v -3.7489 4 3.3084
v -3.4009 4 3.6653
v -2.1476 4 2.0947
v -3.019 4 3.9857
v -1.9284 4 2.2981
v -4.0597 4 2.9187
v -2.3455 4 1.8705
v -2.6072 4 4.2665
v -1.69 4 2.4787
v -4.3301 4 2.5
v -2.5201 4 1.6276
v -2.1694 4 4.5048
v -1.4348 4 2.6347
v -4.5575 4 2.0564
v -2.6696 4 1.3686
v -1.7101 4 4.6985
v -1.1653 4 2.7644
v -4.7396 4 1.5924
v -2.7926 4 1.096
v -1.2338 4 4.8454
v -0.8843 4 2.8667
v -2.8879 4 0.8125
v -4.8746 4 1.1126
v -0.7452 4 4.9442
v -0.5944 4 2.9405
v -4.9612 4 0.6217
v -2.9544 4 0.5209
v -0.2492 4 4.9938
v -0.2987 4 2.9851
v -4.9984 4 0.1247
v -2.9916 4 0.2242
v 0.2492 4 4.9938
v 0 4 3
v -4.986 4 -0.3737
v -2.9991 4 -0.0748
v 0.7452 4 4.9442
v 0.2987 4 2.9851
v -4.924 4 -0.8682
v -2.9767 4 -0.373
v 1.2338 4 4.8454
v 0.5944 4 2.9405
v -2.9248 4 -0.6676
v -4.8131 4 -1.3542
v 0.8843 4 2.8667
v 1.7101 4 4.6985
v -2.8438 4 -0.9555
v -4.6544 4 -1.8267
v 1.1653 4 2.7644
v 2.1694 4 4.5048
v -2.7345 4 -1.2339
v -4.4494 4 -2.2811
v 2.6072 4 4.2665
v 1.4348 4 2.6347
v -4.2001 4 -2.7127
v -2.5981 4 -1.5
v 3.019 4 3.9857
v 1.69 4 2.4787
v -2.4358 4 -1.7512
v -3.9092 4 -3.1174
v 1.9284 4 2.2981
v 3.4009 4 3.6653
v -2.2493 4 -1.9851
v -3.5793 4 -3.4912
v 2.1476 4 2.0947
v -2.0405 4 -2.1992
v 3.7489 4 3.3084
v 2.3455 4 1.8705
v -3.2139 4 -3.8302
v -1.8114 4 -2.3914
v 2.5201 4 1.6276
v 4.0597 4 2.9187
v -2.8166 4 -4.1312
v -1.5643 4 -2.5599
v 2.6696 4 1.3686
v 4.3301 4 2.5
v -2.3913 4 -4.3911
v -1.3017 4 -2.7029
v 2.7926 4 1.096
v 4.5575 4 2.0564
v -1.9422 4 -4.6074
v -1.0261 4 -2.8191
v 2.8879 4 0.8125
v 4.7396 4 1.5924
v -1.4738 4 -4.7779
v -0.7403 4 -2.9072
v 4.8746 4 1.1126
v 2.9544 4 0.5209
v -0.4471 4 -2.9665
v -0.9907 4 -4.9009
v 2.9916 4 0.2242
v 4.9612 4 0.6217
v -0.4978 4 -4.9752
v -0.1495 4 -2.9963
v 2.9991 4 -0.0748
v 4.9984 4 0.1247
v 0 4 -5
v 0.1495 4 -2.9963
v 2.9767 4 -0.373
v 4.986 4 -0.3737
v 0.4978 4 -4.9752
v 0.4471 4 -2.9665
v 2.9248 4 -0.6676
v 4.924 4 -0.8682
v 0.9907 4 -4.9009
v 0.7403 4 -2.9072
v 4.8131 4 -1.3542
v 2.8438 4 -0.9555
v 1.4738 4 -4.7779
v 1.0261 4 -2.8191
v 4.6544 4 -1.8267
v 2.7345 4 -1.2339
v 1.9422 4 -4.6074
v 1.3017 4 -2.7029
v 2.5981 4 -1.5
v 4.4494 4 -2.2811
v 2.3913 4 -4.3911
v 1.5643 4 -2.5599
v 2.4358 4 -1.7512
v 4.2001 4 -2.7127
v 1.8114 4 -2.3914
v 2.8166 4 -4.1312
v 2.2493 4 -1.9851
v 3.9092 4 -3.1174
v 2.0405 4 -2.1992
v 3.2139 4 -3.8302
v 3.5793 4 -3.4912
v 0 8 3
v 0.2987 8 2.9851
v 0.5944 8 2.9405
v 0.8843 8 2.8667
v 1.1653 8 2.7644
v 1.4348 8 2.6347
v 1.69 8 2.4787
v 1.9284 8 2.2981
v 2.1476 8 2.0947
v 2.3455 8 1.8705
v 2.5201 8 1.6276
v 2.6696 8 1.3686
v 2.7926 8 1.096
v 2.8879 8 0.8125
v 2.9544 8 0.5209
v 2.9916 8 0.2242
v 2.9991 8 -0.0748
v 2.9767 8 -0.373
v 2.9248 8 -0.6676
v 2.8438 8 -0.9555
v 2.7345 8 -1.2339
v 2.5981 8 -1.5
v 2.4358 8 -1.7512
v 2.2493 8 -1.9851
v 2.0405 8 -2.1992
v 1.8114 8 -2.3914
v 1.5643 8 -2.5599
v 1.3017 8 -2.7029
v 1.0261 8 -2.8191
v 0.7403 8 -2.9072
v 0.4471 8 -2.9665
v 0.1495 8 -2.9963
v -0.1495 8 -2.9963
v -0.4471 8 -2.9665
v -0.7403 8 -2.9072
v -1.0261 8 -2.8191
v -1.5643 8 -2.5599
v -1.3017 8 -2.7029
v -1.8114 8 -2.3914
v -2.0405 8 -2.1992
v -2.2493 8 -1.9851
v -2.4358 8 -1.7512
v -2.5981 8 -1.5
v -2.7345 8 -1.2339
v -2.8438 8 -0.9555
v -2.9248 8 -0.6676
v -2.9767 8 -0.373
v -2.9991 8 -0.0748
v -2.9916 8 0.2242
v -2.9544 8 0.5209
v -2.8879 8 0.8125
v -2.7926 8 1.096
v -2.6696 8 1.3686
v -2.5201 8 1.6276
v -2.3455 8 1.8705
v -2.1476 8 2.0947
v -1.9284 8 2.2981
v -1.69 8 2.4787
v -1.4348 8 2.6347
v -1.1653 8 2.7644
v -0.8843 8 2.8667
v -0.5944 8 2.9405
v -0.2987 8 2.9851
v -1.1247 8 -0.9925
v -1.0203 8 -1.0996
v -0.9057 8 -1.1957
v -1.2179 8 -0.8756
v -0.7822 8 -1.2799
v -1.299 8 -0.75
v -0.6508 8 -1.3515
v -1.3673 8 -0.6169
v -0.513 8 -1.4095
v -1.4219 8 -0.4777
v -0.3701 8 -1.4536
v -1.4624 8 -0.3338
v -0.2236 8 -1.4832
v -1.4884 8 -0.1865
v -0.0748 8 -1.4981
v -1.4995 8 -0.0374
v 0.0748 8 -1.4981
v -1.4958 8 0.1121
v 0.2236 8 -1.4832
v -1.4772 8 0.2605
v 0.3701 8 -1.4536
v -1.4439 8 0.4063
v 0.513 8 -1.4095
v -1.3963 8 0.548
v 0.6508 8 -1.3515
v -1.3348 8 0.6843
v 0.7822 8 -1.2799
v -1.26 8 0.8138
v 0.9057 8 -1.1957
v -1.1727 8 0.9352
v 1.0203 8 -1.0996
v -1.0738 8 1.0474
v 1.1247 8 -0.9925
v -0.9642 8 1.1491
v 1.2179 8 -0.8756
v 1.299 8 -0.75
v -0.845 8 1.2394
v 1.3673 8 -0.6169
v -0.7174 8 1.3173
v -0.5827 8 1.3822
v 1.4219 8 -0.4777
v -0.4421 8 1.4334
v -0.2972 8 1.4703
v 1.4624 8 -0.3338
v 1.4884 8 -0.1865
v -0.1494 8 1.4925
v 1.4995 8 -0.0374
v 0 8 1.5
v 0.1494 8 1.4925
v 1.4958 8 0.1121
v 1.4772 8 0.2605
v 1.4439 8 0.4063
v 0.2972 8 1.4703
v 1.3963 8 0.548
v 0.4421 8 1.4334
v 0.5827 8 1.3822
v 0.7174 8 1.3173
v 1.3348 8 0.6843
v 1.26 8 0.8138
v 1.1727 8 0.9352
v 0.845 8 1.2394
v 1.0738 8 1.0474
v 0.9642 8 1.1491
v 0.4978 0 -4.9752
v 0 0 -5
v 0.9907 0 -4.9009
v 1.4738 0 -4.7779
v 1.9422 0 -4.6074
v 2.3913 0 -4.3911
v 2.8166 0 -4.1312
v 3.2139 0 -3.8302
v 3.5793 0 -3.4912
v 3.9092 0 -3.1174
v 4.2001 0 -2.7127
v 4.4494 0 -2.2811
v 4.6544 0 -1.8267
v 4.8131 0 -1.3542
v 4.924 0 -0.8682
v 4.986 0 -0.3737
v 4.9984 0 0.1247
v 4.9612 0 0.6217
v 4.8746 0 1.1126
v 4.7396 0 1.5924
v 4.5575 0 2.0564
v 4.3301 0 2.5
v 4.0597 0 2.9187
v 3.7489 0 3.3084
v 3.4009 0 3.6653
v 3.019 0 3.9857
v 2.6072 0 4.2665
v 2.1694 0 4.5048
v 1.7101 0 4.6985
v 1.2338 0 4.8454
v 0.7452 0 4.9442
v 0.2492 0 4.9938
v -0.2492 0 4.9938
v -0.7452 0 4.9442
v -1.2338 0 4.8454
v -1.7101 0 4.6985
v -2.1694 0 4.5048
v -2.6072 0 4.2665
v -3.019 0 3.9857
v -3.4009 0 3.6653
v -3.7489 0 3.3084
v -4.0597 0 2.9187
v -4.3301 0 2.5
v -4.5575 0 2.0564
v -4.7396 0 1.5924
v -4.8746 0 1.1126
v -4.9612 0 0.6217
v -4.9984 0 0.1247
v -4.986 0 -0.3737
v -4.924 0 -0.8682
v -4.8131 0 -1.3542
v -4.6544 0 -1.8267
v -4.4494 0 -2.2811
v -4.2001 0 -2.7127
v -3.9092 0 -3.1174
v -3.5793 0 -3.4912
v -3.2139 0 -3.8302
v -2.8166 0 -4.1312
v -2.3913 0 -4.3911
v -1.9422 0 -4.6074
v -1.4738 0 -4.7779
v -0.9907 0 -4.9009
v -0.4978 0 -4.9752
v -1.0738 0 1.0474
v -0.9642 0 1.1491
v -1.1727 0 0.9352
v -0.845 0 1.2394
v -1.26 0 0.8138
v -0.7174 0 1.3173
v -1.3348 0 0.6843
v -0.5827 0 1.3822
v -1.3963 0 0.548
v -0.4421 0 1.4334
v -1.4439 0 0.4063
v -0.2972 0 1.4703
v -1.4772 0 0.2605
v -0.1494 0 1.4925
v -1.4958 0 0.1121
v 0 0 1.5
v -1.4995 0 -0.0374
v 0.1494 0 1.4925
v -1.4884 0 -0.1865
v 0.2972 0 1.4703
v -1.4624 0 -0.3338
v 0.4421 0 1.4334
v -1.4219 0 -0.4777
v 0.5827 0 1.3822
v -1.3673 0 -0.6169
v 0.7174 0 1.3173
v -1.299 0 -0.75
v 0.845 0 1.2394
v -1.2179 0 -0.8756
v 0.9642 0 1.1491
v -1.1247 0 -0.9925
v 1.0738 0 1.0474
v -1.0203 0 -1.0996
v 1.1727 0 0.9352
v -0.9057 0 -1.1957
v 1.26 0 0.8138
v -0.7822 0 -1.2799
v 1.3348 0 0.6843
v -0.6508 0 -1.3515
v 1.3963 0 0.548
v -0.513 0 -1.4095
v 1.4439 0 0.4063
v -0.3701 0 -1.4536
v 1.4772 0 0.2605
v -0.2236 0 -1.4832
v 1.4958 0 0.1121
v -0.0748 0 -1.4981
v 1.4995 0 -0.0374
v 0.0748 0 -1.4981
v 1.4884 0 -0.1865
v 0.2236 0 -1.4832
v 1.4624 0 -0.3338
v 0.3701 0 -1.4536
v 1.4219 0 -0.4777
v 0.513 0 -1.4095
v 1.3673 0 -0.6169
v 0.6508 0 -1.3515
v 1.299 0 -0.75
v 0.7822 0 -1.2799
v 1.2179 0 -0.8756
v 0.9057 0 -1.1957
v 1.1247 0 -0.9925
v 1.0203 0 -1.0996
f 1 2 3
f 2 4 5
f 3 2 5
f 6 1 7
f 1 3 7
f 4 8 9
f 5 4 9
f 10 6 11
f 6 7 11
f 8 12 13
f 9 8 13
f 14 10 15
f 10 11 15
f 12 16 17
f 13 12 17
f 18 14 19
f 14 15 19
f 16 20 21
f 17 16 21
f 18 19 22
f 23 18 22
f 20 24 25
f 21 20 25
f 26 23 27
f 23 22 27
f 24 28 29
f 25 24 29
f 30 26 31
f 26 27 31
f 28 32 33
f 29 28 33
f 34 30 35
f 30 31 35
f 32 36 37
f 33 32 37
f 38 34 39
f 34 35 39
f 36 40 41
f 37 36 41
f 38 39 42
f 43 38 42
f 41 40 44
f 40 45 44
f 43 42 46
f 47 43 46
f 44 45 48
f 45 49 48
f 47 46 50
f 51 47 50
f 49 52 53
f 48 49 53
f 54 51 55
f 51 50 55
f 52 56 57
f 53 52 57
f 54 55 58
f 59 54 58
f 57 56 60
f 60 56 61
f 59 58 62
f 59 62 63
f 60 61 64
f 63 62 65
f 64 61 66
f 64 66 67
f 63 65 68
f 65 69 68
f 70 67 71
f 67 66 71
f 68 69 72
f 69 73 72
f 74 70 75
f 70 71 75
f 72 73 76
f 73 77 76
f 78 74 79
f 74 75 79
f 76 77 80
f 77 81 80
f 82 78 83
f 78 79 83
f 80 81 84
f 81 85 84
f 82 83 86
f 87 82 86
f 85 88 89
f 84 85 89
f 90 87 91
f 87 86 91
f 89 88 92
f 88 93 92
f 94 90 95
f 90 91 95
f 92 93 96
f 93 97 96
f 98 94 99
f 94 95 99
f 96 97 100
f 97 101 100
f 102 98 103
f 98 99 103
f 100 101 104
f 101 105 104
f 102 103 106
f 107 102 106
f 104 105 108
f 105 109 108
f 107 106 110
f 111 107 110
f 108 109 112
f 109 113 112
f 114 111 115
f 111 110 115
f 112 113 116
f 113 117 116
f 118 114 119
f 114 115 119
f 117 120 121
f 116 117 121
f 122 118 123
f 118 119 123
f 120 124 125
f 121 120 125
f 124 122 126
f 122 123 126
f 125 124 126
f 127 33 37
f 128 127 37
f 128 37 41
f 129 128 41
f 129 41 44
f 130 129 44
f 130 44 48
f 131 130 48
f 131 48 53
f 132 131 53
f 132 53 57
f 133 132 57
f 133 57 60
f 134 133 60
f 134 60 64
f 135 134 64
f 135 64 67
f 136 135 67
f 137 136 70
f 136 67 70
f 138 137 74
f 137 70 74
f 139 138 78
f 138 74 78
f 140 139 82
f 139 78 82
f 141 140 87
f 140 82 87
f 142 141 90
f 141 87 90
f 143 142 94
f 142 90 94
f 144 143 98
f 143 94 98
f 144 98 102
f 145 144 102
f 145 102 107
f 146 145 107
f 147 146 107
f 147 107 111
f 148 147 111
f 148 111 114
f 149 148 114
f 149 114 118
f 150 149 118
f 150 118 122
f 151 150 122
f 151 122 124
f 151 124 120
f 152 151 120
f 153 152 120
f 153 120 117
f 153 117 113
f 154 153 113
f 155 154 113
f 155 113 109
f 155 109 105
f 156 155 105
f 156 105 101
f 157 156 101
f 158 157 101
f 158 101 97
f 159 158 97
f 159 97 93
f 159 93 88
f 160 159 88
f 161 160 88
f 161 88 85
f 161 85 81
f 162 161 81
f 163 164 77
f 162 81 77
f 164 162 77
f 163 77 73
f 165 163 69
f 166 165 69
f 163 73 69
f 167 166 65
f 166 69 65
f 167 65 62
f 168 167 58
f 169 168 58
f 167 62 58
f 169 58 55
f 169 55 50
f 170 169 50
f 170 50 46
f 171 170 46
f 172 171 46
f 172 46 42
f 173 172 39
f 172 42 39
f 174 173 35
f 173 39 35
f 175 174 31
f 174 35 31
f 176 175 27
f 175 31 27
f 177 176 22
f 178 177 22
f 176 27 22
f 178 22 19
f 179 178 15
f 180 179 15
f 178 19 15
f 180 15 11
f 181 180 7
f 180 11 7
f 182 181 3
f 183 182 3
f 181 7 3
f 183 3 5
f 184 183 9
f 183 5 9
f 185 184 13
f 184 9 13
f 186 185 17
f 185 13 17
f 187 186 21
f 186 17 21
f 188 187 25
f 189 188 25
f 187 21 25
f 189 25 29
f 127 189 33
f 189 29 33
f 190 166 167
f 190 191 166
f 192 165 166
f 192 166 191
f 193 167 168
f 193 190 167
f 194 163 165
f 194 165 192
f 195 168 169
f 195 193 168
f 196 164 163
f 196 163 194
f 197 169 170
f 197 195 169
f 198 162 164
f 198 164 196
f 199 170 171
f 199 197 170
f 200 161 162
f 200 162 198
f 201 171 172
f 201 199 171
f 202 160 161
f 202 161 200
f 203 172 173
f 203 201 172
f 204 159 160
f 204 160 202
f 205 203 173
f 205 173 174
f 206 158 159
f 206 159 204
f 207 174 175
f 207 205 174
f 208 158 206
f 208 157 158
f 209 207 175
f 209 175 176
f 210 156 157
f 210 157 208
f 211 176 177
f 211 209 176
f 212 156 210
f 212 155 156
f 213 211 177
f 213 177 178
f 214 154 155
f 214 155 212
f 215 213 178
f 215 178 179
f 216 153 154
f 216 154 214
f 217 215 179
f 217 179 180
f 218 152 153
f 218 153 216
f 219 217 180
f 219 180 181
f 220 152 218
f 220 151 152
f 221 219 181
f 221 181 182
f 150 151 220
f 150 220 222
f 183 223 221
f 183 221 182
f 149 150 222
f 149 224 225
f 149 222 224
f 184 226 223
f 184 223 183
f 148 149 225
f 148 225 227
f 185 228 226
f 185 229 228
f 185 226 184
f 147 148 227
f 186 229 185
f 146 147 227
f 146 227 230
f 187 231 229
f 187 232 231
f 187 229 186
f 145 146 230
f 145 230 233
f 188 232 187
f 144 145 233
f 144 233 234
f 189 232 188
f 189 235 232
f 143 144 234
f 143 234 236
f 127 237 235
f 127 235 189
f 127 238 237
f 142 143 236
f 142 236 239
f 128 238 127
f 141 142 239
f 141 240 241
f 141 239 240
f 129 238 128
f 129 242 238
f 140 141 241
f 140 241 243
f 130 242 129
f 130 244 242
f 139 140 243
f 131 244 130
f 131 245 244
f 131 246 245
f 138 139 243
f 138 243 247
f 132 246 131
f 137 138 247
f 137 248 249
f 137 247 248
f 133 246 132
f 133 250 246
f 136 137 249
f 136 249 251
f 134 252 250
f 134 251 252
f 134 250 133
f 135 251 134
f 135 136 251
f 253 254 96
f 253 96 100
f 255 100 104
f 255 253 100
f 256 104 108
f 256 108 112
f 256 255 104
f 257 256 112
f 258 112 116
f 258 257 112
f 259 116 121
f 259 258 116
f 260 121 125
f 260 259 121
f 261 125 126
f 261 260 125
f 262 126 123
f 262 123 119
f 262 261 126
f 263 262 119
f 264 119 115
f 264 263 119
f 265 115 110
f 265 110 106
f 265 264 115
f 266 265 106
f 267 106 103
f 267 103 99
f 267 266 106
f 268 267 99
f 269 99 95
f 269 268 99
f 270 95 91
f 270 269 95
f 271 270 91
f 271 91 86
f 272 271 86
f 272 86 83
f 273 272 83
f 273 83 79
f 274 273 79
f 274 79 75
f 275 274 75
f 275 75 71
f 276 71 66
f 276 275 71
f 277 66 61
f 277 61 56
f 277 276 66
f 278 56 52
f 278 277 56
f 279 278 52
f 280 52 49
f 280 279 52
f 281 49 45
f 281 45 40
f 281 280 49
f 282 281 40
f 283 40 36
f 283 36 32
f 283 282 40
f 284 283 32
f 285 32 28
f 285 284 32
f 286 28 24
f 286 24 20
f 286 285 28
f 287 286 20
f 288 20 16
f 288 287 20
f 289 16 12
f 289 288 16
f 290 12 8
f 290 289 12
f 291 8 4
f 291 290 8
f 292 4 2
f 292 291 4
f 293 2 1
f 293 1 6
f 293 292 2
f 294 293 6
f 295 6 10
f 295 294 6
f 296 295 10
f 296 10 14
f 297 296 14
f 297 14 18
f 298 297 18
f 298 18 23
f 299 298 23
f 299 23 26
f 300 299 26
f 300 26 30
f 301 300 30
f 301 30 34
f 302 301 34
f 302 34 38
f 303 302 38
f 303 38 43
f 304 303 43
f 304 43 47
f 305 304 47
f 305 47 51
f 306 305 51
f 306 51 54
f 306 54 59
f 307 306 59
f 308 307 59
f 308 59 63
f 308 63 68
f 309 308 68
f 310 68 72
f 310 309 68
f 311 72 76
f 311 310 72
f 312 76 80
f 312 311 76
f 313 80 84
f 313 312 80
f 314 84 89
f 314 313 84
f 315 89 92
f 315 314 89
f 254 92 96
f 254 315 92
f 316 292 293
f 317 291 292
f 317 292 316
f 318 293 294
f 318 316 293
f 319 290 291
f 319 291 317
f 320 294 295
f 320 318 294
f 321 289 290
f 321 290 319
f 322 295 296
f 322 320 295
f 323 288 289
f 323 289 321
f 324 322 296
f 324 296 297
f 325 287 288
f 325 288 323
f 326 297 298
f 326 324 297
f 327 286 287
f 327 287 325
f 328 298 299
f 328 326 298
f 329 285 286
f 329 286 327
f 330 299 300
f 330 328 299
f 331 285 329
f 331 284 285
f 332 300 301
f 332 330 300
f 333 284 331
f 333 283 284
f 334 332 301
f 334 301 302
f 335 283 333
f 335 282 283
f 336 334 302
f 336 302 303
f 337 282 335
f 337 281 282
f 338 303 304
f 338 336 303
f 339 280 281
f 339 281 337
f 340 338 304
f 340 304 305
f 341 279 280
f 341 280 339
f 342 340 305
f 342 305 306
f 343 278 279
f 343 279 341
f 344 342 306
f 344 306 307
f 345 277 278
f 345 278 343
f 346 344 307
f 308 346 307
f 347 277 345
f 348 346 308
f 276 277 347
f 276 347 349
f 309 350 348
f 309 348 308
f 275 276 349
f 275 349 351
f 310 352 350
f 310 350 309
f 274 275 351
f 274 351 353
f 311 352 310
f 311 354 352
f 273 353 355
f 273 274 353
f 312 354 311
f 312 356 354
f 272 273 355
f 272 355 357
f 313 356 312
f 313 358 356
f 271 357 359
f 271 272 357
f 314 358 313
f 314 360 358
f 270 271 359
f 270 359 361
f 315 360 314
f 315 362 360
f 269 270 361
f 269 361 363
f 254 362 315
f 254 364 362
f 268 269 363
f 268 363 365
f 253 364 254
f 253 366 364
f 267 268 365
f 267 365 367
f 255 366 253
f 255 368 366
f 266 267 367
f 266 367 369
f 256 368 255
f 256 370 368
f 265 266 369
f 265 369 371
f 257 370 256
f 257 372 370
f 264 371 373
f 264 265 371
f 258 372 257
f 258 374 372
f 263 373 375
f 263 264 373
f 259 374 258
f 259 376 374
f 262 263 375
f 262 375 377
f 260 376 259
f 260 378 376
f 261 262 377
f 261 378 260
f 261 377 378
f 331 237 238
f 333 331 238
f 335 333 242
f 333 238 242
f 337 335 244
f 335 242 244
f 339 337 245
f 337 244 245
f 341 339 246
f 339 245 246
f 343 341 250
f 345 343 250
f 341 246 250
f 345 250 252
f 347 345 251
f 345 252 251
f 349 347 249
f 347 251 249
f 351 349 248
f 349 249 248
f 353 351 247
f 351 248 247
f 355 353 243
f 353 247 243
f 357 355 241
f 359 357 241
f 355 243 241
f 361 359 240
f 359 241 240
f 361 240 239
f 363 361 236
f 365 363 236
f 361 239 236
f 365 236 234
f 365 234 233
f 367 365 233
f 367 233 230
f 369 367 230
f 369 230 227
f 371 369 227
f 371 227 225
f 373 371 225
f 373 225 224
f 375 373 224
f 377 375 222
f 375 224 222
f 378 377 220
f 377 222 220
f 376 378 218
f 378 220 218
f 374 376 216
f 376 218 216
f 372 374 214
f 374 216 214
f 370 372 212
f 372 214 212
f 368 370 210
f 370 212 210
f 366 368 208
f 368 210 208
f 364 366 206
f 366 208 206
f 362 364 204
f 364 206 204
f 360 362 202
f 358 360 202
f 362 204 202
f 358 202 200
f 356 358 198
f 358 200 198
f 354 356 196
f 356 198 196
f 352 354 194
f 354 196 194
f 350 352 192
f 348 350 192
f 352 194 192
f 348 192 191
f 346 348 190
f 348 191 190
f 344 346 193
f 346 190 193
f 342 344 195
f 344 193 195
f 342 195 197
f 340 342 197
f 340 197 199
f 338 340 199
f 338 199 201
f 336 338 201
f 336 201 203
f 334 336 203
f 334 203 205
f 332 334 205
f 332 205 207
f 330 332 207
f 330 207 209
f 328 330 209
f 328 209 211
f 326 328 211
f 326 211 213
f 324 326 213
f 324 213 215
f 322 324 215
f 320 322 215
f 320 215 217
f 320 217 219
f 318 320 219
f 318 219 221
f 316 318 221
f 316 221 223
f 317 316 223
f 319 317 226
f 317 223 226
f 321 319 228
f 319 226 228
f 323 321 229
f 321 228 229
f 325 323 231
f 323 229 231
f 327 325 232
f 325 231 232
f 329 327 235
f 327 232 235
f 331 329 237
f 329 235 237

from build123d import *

# Parameters (mm, degrees)
SKETCH_1_R          = 3
EXTRUDE_1_DEPTH     = 8
SKETCH_2_R          = 1.5
CUT_EXTRUDE_1_DEPTH = 8
SKETCH_3_R          = 5
SKETCH_3_R_2        = 1.511526568
EXTRUDE_2_DEPTH     = 4


with BuildPart() as part:
    # 草图1 → 凸台-拉伸1 (new body)
    with BuildSketch(Plane(origin=(0, 0, 0), x_dir=(1, 0, 0), z_dir=(0, 1, 0))):
        with Locations(Location((0, 0, 0), (0, 0, 270))):
            Circle(SKETCH_1_R)
    extrude(amount=EXTRUDE_1_DEPTH)

    # 草图2 → 切除-拉伸1 (cut)
    with BuildSketch(Plane(origin=(0, 8, 0), x_dir=(1, 0, 0), z_dir=(0, 1, 0))):
        with Locations(Location((0, 0, 0), (0, 0, 270))):
            Circle(SKETCH_2_R)
    extrude(amount=-CUT_EXTRUDE_1_DEPTH, mode=Mode.SUBTRACT)

    # 草图3 → 凸台-拉伸2 (add)
    with BuildSketch(Plane.XZ):
        with Locations(Location((0, 0, 0), (0, 0, 270))):
            Circle(SKETCH_3_R)
        Circle(SKETCH_3_R_2, mode=Mode.SUBTRACT)
    extrude(amount=-EXTRUDE_2_DEPTH)


solid = part.part
